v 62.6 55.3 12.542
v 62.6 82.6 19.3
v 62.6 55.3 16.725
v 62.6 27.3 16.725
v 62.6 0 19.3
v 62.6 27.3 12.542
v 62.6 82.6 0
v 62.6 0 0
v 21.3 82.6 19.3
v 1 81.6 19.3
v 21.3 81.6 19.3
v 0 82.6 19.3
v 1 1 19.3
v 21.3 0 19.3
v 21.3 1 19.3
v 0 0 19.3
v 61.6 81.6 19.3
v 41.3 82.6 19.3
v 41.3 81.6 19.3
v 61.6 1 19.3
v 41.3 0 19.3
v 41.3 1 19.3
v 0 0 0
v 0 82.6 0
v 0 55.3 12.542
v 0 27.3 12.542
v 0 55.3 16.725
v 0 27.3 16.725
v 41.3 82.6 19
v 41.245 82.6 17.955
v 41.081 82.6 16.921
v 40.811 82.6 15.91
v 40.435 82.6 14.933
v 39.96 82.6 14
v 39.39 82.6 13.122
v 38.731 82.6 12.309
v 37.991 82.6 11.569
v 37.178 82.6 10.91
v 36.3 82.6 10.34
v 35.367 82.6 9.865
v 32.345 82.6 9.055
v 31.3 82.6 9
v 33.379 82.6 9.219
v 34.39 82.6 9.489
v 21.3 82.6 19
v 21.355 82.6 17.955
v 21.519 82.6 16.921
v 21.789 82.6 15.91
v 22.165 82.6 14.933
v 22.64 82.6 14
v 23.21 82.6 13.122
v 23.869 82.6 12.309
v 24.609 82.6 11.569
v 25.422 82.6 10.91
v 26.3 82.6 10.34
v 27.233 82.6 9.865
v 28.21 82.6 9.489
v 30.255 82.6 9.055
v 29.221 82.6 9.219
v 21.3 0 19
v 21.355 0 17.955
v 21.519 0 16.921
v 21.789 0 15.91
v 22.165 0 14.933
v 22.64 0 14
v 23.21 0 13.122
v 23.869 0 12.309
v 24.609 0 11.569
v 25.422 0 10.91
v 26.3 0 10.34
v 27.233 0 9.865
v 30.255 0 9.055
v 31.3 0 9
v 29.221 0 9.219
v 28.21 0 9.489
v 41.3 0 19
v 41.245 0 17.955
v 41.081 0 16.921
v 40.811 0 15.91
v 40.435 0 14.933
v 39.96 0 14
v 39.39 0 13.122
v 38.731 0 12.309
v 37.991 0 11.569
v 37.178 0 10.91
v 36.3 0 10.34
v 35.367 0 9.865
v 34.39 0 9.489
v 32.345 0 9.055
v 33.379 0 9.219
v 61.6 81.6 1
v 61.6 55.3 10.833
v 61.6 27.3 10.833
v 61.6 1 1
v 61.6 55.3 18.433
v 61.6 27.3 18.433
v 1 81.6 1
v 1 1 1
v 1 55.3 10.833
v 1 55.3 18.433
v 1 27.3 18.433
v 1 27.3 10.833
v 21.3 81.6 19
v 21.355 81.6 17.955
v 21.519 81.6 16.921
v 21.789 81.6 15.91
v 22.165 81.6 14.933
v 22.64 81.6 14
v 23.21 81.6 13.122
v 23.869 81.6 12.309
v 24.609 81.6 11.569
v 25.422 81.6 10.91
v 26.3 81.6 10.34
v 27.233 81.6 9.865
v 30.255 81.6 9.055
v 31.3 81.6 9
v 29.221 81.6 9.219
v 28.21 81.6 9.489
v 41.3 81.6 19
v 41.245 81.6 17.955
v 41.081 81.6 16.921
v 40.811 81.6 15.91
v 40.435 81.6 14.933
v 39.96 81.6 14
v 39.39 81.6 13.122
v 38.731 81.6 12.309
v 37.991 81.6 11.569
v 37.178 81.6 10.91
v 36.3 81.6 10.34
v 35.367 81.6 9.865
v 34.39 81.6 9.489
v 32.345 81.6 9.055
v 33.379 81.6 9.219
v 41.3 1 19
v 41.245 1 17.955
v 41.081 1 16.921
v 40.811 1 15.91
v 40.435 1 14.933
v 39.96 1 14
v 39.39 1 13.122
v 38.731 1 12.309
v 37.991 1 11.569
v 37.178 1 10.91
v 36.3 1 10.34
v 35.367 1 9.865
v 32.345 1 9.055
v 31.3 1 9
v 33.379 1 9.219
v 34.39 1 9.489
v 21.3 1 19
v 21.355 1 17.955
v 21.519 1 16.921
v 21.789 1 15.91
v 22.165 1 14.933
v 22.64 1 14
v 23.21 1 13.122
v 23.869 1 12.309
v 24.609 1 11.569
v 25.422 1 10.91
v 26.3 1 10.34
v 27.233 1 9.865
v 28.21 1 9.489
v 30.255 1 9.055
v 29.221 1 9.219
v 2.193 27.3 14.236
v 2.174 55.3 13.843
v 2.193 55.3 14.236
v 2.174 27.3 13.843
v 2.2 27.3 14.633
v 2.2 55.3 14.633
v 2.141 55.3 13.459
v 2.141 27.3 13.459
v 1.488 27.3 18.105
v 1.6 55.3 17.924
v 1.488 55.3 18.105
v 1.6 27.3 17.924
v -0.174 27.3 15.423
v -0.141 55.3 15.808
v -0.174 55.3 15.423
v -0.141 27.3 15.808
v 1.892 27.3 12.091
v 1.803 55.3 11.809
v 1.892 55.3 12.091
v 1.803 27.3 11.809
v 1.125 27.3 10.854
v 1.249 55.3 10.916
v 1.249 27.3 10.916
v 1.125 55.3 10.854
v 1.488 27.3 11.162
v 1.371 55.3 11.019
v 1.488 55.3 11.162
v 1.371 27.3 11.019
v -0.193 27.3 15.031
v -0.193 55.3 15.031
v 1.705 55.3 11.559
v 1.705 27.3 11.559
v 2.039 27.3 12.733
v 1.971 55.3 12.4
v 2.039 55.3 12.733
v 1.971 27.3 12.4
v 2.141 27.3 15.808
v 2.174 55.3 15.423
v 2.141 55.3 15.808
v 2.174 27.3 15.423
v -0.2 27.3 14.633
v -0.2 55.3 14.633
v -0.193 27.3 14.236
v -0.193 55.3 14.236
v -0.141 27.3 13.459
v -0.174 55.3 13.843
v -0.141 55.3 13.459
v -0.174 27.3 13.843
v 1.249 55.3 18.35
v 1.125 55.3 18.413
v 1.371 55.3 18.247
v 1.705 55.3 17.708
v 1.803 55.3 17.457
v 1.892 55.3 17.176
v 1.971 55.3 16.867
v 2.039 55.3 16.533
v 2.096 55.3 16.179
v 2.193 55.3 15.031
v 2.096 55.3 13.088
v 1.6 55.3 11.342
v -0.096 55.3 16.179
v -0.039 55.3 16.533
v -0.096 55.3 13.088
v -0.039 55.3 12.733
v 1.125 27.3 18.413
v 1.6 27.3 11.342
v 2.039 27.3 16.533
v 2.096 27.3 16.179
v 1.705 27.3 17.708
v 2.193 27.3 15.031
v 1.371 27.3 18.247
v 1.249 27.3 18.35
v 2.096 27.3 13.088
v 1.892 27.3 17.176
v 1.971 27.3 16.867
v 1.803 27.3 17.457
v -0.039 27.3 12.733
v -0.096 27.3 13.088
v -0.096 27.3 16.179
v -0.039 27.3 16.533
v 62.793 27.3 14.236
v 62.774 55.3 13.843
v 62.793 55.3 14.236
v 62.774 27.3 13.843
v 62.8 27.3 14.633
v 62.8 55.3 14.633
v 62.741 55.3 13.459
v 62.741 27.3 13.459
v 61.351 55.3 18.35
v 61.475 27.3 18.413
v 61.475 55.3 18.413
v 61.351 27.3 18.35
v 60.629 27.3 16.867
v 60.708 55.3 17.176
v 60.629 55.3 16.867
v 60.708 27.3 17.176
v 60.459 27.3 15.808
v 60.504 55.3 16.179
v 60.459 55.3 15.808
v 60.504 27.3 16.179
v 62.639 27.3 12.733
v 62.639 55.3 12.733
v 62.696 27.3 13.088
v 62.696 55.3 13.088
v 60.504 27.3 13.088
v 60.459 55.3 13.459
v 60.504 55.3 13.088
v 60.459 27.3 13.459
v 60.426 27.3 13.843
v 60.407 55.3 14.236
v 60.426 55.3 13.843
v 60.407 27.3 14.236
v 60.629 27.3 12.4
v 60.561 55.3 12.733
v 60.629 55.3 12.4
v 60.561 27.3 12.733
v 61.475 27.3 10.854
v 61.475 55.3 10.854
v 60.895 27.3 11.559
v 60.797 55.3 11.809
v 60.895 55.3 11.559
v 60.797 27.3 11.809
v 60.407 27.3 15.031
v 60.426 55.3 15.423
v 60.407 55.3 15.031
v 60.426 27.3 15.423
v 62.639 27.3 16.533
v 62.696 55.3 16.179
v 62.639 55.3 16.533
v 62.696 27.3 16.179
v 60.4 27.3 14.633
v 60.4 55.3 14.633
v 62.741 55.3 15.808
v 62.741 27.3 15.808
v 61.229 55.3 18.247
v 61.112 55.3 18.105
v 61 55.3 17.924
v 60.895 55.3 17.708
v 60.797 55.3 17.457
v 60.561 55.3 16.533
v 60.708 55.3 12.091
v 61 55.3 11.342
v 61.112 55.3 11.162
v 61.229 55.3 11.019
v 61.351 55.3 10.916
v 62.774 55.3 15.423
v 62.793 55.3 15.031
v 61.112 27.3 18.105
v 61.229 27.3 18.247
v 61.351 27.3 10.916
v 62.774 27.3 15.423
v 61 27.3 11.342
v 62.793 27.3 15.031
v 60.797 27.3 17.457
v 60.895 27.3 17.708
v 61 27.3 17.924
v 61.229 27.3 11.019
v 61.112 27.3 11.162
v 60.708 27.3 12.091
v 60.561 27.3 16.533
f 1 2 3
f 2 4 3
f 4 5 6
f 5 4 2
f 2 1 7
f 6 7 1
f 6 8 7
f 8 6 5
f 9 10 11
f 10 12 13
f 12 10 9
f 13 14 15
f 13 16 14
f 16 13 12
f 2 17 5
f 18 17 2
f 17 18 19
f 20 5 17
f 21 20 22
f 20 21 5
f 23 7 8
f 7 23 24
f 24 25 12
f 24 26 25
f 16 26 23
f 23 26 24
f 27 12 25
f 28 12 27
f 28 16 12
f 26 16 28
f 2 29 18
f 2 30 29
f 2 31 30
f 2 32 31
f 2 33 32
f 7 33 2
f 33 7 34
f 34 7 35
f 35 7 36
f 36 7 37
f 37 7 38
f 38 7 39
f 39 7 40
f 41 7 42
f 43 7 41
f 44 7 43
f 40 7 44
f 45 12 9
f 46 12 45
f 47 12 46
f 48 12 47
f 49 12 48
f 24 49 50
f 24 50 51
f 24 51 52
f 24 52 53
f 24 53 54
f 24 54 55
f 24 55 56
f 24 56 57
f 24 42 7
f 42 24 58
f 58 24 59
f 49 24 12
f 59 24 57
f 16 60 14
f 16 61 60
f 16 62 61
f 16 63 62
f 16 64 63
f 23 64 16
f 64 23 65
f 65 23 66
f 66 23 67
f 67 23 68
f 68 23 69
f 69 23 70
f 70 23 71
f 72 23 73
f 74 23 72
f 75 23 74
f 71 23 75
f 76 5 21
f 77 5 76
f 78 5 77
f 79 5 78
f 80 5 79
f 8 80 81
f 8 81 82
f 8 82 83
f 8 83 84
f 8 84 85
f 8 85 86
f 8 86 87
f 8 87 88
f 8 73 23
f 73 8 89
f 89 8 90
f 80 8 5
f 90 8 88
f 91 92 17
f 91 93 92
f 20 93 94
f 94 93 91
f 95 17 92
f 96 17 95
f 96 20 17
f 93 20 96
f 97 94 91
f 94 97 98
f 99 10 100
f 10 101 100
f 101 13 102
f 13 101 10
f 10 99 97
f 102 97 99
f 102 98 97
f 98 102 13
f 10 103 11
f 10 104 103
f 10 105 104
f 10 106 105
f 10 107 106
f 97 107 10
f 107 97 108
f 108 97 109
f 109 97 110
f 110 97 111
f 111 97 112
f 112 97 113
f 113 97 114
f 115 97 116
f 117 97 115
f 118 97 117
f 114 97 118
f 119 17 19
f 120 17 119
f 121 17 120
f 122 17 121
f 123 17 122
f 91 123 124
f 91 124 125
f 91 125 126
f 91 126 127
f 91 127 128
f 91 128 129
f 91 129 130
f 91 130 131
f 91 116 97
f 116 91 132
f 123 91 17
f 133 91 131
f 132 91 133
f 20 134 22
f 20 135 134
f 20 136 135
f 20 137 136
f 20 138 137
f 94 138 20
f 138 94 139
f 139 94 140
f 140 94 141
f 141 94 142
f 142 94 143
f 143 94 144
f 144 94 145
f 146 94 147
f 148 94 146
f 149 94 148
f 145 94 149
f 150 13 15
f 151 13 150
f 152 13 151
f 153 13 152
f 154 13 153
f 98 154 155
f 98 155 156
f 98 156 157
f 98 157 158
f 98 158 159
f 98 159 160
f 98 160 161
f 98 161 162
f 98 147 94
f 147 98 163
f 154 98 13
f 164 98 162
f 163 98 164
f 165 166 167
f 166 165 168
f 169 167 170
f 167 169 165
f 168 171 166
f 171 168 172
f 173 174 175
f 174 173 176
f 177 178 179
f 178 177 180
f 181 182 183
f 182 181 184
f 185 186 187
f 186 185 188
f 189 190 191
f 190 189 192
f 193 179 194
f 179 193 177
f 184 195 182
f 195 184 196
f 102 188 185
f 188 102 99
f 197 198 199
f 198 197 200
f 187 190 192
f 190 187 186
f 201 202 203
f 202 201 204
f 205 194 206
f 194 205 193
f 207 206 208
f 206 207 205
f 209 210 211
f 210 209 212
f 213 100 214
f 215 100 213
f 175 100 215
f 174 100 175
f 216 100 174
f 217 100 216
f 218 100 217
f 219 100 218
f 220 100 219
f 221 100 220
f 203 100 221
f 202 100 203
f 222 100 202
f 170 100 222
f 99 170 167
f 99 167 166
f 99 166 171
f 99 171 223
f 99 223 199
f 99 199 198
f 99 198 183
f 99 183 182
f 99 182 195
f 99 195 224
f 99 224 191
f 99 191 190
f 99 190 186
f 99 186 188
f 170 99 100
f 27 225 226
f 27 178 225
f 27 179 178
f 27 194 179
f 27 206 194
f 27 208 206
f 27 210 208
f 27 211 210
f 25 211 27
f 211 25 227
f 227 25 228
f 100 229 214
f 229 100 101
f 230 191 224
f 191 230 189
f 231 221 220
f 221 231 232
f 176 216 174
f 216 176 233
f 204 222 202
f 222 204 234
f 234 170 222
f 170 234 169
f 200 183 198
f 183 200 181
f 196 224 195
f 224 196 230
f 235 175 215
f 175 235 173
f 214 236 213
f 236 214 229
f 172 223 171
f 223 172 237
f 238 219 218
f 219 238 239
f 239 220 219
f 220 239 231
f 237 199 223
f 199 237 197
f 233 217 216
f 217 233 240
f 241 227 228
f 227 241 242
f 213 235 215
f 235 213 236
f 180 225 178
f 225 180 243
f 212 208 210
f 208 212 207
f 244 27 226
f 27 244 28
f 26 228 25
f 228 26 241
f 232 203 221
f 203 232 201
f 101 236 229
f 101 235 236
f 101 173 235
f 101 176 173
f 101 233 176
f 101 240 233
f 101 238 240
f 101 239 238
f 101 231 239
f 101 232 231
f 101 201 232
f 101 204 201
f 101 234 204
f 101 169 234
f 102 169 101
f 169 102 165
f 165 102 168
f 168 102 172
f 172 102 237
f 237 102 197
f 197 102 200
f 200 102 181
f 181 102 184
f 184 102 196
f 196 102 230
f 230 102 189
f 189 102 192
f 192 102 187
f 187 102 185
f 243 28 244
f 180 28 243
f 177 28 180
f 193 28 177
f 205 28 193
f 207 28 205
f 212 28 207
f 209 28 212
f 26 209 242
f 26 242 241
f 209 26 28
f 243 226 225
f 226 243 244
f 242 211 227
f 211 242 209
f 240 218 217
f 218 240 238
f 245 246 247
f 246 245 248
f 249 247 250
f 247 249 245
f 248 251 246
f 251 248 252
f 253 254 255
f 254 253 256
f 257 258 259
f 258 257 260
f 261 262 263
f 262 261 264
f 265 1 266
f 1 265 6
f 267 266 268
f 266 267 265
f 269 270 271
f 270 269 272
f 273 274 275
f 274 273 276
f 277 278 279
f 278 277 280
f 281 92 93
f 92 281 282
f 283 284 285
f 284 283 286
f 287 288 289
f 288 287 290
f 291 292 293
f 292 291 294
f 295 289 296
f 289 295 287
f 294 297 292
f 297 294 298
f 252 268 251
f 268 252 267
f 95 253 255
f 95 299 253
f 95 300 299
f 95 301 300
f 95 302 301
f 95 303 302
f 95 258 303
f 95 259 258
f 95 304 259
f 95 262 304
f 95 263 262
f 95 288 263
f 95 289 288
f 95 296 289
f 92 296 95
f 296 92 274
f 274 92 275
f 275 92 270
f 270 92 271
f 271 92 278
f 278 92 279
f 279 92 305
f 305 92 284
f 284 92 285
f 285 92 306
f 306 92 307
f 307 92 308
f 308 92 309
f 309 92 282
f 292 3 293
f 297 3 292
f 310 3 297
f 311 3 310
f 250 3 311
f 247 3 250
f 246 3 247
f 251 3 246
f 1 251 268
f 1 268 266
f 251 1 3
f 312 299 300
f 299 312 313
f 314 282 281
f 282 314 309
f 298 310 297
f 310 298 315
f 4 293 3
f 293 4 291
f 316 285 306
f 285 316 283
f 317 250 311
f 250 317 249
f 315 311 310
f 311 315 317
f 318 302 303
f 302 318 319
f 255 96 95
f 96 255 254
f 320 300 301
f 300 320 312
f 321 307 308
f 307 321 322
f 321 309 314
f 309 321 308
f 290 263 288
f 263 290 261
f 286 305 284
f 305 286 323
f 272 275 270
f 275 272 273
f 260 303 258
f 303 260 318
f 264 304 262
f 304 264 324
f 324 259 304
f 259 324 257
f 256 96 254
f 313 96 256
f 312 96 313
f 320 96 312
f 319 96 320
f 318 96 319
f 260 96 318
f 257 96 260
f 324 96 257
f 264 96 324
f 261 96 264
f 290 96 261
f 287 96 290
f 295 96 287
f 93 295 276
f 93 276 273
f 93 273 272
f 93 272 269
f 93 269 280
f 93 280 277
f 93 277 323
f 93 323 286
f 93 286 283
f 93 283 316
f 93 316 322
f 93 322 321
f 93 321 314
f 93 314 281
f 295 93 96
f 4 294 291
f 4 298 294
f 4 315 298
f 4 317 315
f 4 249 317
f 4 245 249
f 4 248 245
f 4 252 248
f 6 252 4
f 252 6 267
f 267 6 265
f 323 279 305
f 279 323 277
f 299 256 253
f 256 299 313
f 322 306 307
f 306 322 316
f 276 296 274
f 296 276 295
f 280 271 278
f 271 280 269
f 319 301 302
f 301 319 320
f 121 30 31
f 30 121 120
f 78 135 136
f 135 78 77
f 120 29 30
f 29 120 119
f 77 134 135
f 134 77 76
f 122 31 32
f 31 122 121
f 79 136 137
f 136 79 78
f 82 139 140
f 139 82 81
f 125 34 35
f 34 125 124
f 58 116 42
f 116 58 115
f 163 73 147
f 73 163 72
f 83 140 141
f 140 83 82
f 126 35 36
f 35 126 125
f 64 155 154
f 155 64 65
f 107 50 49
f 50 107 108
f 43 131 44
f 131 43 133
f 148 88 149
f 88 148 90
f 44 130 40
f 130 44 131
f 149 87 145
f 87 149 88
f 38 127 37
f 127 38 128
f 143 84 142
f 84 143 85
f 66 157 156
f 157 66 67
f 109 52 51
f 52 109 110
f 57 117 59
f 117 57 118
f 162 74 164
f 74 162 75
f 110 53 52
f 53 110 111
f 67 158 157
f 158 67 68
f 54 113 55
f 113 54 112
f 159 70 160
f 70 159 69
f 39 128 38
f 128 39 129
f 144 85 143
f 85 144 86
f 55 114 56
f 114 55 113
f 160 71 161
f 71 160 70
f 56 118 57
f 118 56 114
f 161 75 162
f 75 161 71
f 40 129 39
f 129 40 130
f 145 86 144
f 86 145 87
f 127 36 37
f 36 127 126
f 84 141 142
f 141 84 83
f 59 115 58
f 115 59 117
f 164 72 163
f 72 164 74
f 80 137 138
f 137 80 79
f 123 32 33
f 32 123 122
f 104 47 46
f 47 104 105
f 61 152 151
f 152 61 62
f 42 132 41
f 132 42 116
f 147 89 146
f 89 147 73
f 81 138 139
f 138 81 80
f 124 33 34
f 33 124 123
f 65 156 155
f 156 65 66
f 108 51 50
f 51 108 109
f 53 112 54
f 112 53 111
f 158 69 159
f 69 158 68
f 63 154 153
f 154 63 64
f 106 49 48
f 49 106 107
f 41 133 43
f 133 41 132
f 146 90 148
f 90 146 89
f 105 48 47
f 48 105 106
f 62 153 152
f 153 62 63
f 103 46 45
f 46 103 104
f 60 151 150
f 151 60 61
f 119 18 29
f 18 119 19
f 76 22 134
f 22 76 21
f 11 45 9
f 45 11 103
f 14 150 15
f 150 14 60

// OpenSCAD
$fn = 60;
DELTA=0.01;

WIDTH = 60;
LENGTH = 80;
HEIGHT= 20;
WALL = 1;

PAD=0.3;

HANDLE_D = 8;
HANDLE_L = 30;

MODE_ASSEMBLY = 0;
MODE_BODY = 1;
MODE_CAP = 2;
PRINT_MODE = MODE_CAP;

module box(w,l,h,wall)
{
	real_w = w;
	real_l = l;
	real_h = h;
	inner_w = w - 2*wall;
	inner_l = l - 2*wall;
	inner_h = h;
	difference()
		{
			cube([real_w, real_l, real_h]);
			translate([wall,wall,wall])cube([inner_w, inner_l, inner_h]);
		}
}

NOZZLE_D=0.4;
module body()
{
	mid_l = (LENGTH - HANDLE_L) / 2;
	wall = max(WALL, (HANDLE_D * 0.2)/2 + NOZZLE_D);
	echo("WALL",wall);
	difference()
		{
			box(WIDTH, LENGTH, HEIGHT, wall);
			translate([0, mid_l, HEIGHT/3]) rotate([270,0,0]) scale([0.2,1,1]) cylinder(d=HANDLE_D, h=HANDLE_L);
			translate([WIDTH, mid_l, HEIGHT/3]) rotate([270,0,0]) scale([0.2,1,1]) cylinder(d=HANDLE_D, h=HANDLE_L);
		}
}

module cap()
{
	SCALE=0.3;
	width = WIDTH + 2*(WALL+PAD);
	length = LENGTH+2*(WALL+PAD);
	handle_l = HANDLE_L - 2*WALL;
	mid_l = (length - handle_l) / 2;
	total_z = HEIGHT+WALL+PAD;
	bar_z = total_z + WALL + PAD - (WALL+PAD + HEIGHT/3);

	difference()
		{
			union()
			{
				box(width, length, total_z-2, WALL);
				translate([0+WALL, mid_l, bar_z]) rotate([270,0,0]) scale([SCALE,0.95,1]) cylinder(d=HANDLE_D, h=handle_l);
				translate([WIDTH+WALL+2*PAD, mid_l, bar_z]) rotate([270,0,0]) scale([SCALE,0.95,1]) cylinder(d=HANDLE_D, h=handle_l);
			}

			N=20;
			translate([width/2, -DELTA, 3*HEIGHT/4+N/5]) union() {
				rotate([270,0,0]) cylinder(d=N,h=2*DELTA+length);
				translate([-N/2,0,0]) cube([N,2*DELTA+length, N]);
			}
		}
}

if (PRINT_MODE == MODE_BODY)
	{
		body();
	}
 else if (PRINT_MODE == MODE_CAP)
	 {
		 cap();
	 }
 else if (PRINT_MODE == MODE_ASSEMBLY)
	 {
		 difference()
			 {
				 union()
				 {
					 if(1)color([1,0,0,1])translate([WALL+PAD,WALL+PAD,WALL+PAD-3]) body();
					 if(1)color([0,1,0,1])
							  translate([WIDTH + 2*(WALL + PAD),0,HEIGHT-PAD]) rotate([0,180,0])
							  intersection()
							  {
								  cap();
								  //	translate([0,10,-10])cube([100,20,100]);
							  }
				 }
				 translate([WIDTH/2,15,-10])rotate([0,0,45])cube([100,100,100]);
			 }
	 }
 else
	 {
		 assert(0, "PRINT_MODE is unknown");
	 }
